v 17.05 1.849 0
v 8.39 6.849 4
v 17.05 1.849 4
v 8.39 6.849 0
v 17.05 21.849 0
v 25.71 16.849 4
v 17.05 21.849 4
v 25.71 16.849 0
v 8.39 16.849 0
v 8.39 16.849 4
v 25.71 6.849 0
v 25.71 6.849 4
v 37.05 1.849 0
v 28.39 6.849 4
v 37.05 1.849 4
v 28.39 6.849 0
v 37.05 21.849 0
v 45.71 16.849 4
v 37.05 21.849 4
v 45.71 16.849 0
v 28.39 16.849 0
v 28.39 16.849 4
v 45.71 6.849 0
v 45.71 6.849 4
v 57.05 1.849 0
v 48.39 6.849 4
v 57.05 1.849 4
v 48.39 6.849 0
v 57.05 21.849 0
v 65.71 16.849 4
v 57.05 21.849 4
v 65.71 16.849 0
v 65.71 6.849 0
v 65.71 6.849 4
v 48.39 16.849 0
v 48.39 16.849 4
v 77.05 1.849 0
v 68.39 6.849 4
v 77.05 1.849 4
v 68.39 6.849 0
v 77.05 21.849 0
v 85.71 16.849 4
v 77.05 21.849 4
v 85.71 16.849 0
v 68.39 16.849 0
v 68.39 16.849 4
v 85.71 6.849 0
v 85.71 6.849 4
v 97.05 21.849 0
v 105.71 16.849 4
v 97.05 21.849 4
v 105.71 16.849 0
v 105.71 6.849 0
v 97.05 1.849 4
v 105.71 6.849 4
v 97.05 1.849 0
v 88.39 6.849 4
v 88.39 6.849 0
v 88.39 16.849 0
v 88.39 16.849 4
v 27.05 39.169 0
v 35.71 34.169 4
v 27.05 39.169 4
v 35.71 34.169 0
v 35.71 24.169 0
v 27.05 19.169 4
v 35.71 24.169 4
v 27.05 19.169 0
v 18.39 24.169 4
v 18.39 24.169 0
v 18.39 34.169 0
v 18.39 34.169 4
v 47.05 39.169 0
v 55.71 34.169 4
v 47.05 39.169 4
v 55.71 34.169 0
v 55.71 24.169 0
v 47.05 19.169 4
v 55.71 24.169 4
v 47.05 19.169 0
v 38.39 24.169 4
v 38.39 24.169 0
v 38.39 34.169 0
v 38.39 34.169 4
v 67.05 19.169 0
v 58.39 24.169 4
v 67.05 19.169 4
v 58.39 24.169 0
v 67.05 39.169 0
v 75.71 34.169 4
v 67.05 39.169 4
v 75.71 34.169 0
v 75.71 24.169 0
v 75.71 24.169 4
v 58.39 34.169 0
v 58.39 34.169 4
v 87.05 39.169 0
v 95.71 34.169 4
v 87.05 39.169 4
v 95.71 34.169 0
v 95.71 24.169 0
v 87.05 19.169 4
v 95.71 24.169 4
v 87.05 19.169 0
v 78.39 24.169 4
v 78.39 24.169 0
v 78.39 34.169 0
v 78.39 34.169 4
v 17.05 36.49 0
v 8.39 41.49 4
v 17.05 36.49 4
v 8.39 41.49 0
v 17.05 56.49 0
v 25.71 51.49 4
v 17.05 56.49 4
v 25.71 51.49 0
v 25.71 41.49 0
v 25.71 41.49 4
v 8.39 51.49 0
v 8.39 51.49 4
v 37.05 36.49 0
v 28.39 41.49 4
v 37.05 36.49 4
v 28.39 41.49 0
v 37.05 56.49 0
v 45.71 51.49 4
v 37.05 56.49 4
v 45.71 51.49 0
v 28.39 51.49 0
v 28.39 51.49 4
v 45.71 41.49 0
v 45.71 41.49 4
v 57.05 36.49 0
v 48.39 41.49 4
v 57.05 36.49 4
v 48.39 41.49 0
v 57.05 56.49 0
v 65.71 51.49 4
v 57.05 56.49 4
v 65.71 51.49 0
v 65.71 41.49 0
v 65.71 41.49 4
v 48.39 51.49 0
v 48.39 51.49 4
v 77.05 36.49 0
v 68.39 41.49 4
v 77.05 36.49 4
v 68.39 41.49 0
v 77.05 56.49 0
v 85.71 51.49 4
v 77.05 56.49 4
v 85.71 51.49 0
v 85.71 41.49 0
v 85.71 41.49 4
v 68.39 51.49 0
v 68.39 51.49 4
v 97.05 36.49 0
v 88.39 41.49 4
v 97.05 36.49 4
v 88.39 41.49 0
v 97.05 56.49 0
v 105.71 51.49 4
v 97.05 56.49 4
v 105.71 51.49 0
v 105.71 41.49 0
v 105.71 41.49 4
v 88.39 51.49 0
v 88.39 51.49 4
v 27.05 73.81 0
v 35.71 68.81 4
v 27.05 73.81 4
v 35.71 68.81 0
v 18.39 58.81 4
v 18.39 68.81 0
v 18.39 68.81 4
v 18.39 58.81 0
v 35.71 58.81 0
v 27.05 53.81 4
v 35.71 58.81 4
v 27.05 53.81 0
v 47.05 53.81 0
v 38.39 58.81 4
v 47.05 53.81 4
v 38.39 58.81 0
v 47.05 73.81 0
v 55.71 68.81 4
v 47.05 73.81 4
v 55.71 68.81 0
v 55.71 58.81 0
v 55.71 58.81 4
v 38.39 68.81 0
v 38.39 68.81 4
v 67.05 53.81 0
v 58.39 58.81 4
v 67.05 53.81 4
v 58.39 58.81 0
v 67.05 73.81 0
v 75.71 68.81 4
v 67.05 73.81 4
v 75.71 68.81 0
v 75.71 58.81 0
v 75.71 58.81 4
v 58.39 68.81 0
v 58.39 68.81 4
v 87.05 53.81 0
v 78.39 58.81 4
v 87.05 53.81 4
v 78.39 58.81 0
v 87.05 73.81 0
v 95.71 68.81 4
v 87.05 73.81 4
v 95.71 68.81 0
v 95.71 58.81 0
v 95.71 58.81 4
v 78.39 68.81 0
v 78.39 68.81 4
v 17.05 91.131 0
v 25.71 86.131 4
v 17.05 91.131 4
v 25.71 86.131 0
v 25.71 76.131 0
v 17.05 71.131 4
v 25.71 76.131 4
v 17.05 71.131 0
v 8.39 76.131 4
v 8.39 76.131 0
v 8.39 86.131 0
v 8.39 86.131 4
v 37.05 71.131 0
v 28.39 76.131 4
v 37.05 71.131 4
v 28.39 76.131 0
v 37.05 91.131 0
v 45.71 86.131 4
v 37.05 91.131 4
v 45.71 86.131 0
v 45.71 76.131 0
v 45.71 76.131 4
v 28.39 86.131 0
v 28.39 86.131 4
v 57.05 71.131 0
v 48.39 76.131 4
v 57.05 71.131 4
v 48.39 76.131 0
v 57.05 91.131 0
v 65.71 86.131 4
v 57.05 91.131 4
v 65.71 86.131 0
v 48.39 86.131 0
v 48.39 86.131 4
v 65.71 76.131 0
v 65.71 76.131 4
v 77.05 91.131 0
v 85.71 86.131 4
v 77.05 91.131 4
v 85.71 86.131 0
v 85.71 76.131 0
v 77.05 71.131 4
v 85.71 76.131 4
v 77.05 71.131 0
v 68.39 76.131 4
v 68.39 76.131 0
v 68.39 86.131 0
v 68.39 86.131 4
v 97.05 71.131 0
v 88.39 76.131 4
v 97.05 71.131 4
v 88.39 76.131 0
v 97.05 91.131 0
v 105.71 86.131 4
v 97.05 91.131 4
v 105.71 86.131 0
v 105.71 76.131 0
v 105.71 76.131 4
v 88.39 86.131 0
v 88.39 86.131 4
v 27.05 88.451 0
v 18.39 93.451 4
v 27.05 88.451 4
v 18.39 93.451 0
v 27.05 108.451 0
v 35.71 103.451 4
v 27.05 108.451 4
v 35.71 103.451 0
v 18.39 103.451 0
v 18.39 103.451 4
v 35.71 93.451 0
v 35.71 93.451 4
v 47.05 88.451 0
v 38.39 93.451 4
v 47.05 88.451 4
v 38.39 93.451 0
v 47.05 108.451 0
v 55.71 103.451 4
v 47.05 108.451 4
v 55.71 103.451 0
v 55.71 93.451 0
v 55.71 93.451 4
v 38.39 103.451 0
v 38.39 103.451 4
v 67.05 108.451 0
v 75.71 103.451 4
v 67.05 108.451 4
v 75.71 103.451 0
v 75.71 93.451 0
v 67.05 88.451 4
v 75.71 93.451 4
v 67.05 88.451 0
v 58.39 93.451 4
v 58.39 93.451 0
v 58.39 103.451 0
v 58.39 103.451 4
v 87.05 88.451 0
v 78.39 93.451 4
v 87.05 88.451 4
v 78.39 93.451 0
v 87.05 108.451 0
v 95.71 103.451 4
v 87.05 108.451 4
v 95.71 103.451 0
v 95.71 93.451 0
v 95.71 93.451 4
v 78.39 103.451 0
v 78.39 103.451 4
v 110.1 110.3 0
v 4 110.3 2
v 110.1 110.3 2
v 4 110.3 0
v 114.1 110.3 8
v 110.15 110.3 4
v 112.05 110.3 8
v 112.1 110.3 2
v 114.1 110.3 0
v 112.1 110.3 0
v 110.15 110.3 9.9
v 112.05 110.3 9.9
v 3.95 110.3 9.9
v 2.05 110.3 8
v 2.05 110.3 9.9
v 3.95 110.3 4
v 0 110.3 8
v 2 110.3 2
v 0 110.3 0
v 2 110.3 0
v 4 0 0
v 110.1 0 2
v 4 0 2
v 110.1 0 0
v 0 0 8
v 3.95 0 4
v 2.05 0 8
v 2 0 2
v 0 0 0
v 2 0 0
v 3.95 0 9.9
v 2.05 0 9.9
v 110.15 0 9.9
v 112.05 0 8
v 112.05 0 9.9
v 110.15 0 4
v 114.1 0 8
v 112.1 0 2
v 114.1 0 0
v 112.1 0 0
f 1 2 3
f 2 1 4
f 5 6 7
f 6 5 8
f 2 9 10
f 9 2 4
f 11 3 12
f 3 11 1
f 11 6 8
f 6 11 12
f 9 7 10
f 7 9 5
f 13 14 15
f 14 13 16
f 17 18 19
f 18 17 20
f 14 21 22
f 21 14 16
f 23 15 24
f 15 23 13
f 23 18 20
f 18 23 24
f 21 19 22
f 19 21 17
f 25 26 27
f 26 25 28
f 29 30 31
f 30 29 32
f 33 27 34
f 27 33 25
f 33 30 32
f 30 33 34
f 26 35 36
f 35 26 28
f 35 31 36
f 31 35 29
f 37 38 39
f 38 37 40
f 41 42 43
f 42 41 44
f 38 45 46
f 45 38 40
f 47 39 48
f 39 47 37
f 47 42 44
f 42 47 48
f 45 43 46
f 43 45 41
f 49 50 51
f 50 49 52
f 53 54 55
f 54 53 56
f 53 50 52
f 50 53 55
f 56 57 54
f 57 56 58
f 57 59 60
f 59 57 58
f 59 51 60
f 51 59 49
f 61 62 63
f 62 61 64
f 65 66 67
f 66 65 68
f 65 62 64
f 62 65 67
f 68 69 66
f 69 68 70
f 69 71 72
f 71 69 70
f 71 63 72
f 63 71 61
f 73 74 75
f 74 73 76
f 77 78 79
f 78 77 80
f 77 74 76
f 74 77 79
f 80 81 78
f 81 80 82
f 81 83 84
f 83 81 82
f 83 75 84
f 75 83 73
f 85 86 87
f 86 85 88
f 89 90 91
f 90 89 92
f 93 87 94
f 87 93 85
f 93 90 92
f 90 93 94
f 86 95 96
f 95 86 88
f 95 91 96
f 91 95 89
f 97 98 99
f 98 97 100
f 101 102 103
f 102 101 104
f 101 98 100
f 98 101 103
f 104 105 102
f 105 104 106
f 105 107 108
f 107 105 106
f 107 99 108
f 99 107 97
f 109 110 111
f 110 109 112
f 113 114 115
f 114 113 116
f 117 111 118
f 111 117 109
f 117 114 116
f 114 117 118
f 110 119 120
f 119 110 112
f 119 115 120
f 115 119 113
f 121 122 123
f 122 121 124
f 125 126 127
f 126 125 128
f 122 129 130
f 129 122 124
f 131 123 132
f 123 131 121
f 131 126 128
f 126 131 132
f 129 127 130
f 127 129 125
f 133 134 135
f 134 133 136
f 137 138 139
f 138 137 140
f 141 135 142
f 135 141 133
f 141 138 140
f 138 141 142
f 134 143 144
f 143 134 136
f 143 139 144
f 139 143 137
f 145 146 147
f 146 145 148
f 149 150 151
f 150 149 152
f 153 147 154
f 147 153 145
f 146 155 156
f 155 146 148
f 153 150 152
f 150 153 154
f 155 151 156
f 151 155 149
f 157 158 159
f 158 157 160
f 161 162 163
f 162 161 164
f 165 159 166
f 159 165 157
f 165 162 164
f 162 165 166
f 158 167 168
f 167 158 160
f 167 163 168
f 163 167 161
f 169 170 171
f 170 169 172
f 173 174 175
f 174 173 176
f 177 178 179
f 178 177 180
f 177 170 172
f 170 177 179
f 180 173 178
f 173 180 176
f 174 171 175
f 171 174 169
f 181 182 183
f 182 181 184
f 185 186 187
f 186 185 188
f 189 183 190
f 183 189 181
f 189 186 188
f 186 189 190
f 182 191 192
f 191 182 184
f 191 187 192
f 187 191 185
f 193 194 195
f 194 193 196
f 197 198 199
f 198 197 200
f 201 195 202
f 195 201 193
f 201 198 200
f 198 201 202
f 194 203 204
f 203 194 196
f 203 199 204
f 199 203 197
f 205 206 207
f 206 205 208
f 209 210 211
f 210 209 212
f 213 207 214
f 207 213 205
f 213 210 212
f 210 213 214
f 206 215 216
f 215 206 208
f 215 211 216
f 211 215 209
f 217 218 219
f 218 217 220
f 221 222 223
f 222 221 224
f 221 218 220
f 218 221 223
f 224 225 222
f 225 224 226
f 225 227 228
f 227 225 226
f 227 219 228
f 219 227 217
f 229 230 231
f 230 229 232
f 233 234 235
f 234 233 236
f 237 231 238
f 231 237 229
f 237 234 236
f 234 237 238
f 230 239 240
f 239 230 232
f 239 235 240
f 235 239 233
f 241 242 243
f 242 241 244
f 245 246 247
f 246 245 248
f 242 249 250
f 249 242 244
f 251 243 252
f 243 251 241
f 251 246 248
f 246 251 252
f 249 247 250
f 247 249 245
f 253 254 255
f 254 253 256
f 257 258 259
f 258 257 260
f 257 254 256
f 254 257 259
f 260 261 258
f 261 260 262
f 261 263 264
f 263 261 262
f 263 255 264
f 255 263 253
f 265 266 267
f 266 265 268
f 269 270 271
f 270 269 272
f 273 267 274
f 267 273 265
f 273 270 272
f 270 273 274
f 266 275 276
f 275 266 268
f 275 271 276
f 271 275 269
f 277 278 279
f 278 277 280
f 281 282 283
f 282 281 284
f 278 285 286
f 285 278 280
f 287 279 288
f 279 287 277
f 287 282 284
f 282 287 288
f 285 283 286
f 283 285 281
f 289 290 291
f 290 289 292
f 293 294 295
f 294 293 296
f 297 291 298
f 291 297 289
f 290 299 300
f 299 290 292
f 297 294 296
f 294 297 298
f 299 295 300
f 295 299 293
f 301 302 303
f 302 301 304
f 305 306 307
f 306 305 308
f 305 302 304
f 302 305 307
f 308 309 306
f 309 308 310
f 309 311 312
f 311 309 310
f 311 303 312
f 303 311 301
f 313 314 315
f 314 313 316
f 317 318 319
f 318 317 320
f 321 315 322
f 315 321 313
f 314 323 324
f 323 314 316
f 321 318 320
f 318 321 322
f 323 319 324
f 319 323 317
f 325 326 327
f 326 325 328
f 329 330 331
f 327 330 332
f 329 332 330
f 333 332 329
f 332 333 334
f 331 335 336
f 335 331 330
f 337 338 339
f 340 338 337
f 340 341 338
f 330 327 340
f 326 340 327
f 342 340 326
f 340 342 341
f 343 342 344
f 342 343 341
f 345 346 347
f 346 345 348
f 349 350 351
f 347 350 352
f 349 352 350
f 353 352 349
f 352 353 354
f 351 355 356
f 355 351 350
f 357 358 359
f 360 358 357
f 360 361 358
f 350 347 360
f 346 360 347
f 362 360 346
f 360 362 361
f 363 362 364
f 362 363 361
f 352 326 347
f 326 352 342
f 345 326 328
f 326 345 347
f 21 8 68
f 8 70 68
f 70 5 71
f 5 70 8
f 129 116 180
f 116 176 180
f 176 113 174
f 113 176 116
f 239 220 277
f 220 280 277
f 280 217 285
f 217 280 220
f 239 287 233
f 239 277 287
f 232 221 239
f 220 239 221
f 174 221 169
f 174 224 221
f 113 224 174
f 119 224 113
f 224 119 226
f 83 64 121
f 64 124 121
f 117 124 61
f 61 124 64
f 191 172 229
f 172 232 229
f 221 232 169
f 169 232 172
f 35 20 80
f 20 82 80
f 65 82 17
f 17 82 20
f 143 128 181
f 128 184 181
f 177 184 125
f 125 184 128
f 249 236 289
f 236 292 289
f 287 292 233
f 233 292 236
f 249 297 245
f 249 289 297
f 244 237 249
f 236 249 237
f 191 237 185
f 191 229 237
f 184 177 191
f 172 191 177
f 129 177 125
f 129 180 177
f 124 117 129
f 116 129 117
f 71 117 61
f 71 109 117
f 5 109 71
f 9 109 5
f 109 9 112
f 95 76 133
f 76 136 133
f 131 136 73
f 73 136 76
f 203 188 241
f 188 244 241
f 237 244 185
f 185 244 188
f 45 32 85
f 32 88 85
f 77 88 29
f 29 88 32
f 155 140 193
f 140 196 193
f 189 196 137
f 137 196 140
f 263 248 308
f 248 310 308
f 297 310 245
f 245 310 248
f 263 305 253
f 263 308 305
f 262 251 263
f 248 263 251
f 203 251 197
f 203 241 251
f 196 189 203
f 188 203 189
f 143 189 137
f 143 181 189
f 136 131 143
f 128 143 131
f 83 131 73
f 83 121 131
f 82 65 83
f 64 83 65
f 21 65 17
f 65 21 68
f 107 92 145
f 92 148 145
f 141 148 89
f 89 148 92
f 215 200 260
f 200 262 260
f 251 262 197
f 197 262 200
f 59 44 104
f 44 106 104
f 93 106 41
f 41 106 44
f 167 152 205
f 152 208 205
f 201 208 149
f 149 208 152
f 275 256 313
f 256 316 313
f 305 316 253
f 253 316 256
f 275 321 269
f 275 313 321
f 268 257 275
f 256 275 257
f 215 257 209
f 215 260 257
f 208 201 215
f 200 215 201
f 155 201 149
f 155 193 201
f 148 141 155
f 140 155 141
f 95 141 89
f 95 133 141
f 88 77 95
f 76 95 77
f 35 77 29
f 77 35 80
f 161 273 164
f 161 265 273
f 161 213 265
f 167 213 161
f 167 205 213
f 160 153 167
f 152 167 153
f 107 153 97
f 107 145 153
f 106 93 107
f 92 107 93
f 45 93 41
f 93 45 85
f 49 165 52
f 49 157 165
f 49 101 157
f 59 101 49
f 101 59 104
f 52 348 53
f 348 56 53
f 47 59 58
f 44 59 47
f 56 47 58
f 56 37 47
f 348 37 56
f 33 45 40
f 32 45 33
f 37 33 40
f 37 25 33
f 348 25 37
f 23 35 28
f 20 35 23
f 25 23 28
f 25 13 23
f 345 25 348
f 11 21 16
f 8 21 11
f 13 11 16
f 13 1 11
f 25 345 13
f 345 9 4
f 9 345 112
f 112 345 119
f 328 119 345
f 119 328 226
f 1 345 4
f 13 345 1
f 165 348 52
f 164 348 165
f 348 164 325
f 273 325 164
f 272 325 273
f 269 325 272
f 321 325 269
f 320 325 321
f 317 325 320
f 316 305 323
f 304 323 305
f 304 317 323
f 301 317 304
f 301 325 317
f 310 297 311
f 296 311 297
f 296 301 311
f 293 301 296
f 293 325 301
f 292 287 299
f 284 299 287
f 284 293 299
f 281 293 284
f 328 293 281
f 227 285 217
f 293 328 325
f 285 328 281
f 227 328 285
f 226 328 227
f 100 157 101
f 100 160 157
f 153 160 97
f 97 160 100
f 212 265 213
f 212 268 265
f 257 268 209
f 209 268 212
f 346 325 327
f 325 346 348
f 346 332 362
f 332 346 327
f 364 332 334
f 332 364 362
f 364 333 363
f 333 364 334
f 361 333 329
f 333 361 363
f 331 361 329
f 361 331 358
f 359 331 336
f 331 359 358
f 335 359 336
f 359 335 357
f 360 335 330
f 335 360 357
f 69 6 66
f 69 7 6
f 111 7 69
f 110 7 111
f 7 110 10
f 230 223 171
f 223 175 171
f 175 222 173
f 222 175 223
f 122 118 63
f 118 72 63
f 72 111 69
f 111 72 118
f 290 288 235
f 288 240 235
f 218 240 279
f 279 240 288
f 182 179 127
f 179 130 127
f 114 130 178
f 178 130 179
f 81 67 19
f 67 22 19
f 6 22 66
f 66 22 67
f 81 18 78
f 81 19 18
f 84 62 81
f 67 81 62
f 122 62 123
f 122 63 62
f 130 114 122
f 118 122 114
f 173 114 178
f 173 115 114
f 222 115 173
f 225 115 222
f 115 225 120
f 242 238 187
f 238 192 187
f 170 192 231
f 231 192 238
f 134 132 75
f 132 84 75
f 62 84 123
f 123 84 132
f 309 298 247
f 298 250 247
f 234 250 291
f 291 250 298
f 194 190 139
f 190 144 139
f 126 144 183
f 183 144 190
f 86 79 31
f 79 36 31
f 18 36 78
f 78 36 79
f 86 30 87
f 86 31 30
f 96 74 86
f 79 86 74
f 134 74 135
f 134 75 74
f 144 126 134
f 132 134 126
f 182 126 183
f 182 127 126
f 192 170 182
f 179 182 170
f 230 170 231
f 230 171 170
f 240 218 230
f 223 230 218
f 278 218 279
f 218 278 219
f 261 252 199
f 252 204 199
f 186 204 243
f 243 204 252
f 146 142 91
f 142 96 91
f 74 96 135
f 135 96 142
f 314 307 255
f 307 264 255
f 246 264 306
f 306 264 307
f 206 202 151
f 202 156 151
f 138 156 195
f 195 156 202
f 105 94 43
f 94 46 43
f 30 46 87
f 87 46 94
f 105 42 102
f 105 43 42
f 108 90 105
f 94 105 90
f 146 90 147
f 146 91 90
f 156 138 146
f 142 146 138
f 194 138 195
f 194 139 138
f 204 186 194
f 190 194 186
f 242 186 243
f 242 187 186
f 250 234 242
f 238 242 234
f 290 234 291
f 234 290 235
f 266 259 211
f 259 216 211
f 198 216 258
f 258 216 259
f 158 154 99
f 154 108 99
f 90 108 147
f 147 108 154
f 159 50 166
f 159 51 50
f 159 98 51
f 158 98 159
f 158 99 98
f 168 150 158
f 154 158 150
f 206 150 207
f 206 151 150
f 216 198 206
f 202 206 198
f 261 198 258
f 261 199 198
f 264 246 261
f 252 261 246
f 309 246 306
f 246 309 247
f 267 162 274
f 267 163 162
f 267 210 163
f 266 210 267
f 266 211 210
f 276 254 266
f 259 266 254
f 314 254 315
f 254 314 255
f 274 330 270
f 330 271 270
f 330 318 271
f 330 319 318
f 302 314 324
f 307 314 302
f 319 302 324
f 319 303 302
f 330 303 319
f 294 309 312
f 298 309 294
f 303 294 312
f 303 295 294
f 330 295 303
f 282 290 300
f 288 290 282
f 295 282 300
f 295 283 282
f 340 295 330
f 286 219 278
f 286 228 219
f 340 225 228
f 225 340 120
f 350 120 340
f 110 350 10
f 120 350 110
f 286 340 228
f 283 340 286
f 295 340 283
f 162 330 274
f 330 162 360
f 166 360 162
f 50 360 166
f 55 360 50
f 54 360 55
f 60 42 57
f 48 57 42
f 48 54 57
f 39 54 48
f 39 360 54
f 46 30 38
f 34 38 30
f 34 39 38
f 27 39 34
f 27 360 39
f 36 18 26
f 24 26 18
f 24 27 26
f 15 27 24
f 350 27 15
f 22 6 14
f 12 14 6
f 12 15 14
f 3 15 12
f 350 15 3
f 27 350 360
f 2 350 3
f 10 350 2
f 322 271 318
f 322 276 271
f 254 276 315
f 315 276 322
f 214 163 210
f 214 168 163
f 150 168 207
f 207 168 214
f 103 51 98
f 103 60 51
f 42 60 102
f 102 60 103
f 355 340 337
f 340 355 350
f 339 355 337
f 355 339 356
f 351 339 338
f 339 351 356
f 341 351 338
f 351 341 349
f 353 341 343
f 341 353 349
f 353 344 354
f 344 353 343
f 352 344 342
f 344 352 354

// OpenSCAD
// file: Variables/Threading.scad
// created by IndiePandaaaaa | Lukas

// source M3-M12: https://de.wikipedia.org/wiki/Kernloch
// source UNC14: https://www.thommel.de/de/artikel/werkzeuge,80,format-hsse-maschinengewindebohrer,3017680017/
// source UNC38:https://www.thommel.de/de/artikel/werkzeuge,80,format-hsse-maschinengewindebohrer,3017680021/

// UNC14 => UNC 1/4″ 20  |   UNC38 => UNC 3/8″ 16

core_holes = [
  ["M3", 2.5],
  ["M4", 3.3],
  ["M5", 4.2],
  ["M6", 5.0],
  ["M8", 6.8],
  ["M10", 8.5],
  ["M12", 10.2],
  ["UNC14", 5.1],
  ["UNC38", 8.0],
];

function core_hole(name) = core_holes[search([name], core_holes, num_returns_per_match = 1, index_col_num = 0)[0]][1];

function core_hole_M3() = core_hole("M3");

function core_hole_M4() = core_hole("M4");

function core_hole_M5() = core_hole("M5");

function core_hole_M6() = core_hole("M6");

function core_hole_M8() = core_hole("M8");

function core_hole_M10() = core_hole("M10");

function core_hole_M12() = core_hole("M12");

function core_hole_UNC14() = core_hole("UNC14");

function core_hole_UNC38() = core_hole("UNC38");
// file: Structures/Hexagon.scad
// created by IndiePandaaaaa | Lukas

function hexagon_get_inner_diameter(single_outer_diameter = 20) = tan(60) * (single_outer_diameter / 2);

function hexagon_inbetween_distance_x(single_outer_diameter = 20) = single_outer_diameter -
    hexagon_get_inner_diameter(single_outer_diameter);

function hexagon_get_y_inner_element_additional_height(single_outer_diameter = 20) = single_outer_diameter / 2 +
        hexagon_inbetween_distance_x(single_outer_diameter) * cos(30) + (single_outer_diameter / 2) * cos(60);

function hexagon_get_y_outer_element_height(single_outer_diameter = 20) = single_outer_diameter;

function hexagon_get_y_next_structure(single_outer_diameter = 20) = (single_outer_diameter / 2 * 3) +
            hexagon_inbetween_distance_x(single_outer_diameter) * cos(30) * 2;

function hexagon_get_y_element_height(single_outer_diameter = 20) = hexagon_get_y_outer_element_height(
single_outer_diameter) + hexagon_get_y_inner_element_additional_height(single_outer_diameter);

function hexagon_get_x_element_count(width, single_outer_diameter = 20) = floor(width / single_outer_diameter);

function hexagon_get_y_element_count(depth, single_outer_diameter = 20) = floor(((depth - (hexagon_get_y_element_height(
single_outer_diameter) -
    hexagon_get_y_next_structure(single_outer_diameter))) / hexagon_get_y_next_structure(single_outer_diameter)) * 2);

function hexagon_get_used_width(width, single_outer_diameter = 20) = single_outer_diameter *
    hexagon_get_x_element_count(width, single_outer_diameter) - hexagon_inbetween_distance_x(single_outer_diameter);

//function hexagon_get_used_depth(depth, single_outer_diameter = 20) = hexagon_get_y_next_structure(single_outer_diameter)
//    * (floor(depth / hexagon_get_y_next_structure(single_outer_diameter))) + (hexagon_inbetween_distance_x(single_outer_diameter)) * cos(30);

//function hexagon_get_used_depth(depth, single_outer_diameter = 20) = (hexagon_get_y_element_count(depth,single_outer_diameter) - 1) * 
//			hexagon_get_y_next_structure(single_outer_diameter) + hexagon_get_y_element_height(single_outer_diameter);

function hexagon_get_used_depth(depth, single_outer_diameter = 20) = round(hexagon_get_y_element_count(depth,
single_outer_diameter) / 2) * hexagon_get_y_outer_element_height(single_outer_diameter) +
        floor(hexagon_get_y_element_count(depth, single_outer_diameter) / 2) * (hexagon_get_y_next_structure(
    single_outer_diameter) - single_outer_diameter) +
            (hexagon_get_y_element_count(depth, single_outer_diameter) + 1) % 2 * (hexagon_get_y_element_height(
    single_outer_diameter) - hexagon_get_y_next_structure(single_outer_diameter));

module hexagon_pattern(width, depth, thickness, single_outer_diameter = 20, vertices = 6) {
    inner_diameter = hexagon_get_inner_diameter(single_outer_diameter);

    count_x = hexagon_get_x_element_count(width, single_outer_diameter);
    count_y = hexagon_get_y_element_count(depth, single_outer_diameter);

    angle = 360 / vertices * 1.5;

    for (y = [0:count_y - 1]) {
        for (x = [0:count_x - 1]) {

            if (y % 2 == 0) {
                translate([inner_diameter / 2 + single_outer_diameter * x, (single_outer_diameter / 2) + inner_diameter
                    * y, - 0.01]) {
                    linear_extrude(height = thickness + 0.02) {
                        rotate([0, 0, angle]) circle(d = single_outer_diameter, $fn = vertices);
                    }
                }
            } else if (x < count_x - 1 && y % 2 == 1) {
                translate([inner_diameter / 2 + single_outer_diameter * x + single_outer_diameter / 2,
                        (single_outer_diameter / 2) + inner_diameter * y, - 0.01]) {
                    linear_extrude(height = thickness + 0.02) {
                        rotate([0, 0, angle]) circle(d = single_outer_diameter, $fn = vertices);
                    }
                }
            }

        }
    }
}

width = 100;
depth = 100;
difference() {
    cube([width, depth, 3]);
    translate([(width - hexagon_get_used_width(width)) / 2, (depth - hexagon_get_used_depth(depth)) / 2, 0])
        hexagon_pattern(width, depth, 3);
}
// main file
// created by IndiePandaaaaa | Lukas

use <202304hddBayStackable.scad>
use <Structures/Hexagon.scad>

MODEL_TOLERANCE = 0.15;
TOLERANCE_HDD = 1;

UBASE_THICKNESS = 4;
POST_DEPTH = 7;
POST_DEPTH_SCREW_IN = 16;

WIDTH_HDD = 101.5;
HEIGHT_HDD = 26.5;
FAN_CaseMountingSocket_DISTANCE = 105; // 105 mm is the distance between screws for an 120 mm fan

HDD_BOTTOM_SCREW_DEPTH = 41.3;
HDD_BOTTOM_SCREW_POS_X = 3.2;
HDD_SATA_CONNECTOR_WIDTH = 53;
HDD_SATA_CONNECTOR_POS_X = 7.8;
HDD_SATA_CONNECTOR_HEIGHT = 9;
HDD_SATA_CONNECTOR_CABLE_DEPTH = 39.5;

RUBBER_HEIGHT = 2.3;
RUBBER_WIDTH_ADDITIONAL = 1.3;
RUBBER_HEIGHT_INTERNAL = 1.5;
RUBBER_OD = 10;
RUBBER_OD_ID = 6.2;

SCREW_LENGTH = 12 + 2;  // additionally 2mm for less tolerance issues with threading
SCREW_SOCKET_WIDTH = 10;

FULLMODEL_DEPTH = SCREW_LENGTH + HDD_BOTTOM_SCREW_DEPTH + 55; // ~ 110 mm
FULLMODEL_HEIGHT = UBASE_THICKNESS + 4; // ~ 8 mm total height
FULLMODEL_WIDTH = UBASE_THICKNESS * 2 + TOLERANCE_HDD * 2 + WIDTH_HDD + 2 * RUBBER_WIDTH_ADDITIONAL;

difference() {
    translate([0, FULLMODEL_DEPTH, 0]) rotate([90, 0, 0])
        UBase(FULLMODEL_DEPTH, FULLMODEL_HEIGHT, WIDTH_HDD + 2 * RUBBER_WIDTH_ADDITIONAL,
        TOLERANCE_HDD, UBASE_THICKNESS);

    inner_model_width = FULLMODEL_WIDTH - UBASE_THICKNESS * 2;
    hex_od = 20;
    pos_x = UBASE_THICKNESS + (inner_model_width - hexagon_get_used_width(inner_model_width, hex_od)) / 2;
    pos_y = (FULLMODEL_DEPTH - hexagon_get_used_depth(FULLMODEL_DEPTH, hex_od)) / 2;

    translate([pos_x, pos_y, 0])
        hexagon_pattern(inner_model_width, FULLMODEL_DEPTH, UBASE_THICKNESS, hex_od);
}
